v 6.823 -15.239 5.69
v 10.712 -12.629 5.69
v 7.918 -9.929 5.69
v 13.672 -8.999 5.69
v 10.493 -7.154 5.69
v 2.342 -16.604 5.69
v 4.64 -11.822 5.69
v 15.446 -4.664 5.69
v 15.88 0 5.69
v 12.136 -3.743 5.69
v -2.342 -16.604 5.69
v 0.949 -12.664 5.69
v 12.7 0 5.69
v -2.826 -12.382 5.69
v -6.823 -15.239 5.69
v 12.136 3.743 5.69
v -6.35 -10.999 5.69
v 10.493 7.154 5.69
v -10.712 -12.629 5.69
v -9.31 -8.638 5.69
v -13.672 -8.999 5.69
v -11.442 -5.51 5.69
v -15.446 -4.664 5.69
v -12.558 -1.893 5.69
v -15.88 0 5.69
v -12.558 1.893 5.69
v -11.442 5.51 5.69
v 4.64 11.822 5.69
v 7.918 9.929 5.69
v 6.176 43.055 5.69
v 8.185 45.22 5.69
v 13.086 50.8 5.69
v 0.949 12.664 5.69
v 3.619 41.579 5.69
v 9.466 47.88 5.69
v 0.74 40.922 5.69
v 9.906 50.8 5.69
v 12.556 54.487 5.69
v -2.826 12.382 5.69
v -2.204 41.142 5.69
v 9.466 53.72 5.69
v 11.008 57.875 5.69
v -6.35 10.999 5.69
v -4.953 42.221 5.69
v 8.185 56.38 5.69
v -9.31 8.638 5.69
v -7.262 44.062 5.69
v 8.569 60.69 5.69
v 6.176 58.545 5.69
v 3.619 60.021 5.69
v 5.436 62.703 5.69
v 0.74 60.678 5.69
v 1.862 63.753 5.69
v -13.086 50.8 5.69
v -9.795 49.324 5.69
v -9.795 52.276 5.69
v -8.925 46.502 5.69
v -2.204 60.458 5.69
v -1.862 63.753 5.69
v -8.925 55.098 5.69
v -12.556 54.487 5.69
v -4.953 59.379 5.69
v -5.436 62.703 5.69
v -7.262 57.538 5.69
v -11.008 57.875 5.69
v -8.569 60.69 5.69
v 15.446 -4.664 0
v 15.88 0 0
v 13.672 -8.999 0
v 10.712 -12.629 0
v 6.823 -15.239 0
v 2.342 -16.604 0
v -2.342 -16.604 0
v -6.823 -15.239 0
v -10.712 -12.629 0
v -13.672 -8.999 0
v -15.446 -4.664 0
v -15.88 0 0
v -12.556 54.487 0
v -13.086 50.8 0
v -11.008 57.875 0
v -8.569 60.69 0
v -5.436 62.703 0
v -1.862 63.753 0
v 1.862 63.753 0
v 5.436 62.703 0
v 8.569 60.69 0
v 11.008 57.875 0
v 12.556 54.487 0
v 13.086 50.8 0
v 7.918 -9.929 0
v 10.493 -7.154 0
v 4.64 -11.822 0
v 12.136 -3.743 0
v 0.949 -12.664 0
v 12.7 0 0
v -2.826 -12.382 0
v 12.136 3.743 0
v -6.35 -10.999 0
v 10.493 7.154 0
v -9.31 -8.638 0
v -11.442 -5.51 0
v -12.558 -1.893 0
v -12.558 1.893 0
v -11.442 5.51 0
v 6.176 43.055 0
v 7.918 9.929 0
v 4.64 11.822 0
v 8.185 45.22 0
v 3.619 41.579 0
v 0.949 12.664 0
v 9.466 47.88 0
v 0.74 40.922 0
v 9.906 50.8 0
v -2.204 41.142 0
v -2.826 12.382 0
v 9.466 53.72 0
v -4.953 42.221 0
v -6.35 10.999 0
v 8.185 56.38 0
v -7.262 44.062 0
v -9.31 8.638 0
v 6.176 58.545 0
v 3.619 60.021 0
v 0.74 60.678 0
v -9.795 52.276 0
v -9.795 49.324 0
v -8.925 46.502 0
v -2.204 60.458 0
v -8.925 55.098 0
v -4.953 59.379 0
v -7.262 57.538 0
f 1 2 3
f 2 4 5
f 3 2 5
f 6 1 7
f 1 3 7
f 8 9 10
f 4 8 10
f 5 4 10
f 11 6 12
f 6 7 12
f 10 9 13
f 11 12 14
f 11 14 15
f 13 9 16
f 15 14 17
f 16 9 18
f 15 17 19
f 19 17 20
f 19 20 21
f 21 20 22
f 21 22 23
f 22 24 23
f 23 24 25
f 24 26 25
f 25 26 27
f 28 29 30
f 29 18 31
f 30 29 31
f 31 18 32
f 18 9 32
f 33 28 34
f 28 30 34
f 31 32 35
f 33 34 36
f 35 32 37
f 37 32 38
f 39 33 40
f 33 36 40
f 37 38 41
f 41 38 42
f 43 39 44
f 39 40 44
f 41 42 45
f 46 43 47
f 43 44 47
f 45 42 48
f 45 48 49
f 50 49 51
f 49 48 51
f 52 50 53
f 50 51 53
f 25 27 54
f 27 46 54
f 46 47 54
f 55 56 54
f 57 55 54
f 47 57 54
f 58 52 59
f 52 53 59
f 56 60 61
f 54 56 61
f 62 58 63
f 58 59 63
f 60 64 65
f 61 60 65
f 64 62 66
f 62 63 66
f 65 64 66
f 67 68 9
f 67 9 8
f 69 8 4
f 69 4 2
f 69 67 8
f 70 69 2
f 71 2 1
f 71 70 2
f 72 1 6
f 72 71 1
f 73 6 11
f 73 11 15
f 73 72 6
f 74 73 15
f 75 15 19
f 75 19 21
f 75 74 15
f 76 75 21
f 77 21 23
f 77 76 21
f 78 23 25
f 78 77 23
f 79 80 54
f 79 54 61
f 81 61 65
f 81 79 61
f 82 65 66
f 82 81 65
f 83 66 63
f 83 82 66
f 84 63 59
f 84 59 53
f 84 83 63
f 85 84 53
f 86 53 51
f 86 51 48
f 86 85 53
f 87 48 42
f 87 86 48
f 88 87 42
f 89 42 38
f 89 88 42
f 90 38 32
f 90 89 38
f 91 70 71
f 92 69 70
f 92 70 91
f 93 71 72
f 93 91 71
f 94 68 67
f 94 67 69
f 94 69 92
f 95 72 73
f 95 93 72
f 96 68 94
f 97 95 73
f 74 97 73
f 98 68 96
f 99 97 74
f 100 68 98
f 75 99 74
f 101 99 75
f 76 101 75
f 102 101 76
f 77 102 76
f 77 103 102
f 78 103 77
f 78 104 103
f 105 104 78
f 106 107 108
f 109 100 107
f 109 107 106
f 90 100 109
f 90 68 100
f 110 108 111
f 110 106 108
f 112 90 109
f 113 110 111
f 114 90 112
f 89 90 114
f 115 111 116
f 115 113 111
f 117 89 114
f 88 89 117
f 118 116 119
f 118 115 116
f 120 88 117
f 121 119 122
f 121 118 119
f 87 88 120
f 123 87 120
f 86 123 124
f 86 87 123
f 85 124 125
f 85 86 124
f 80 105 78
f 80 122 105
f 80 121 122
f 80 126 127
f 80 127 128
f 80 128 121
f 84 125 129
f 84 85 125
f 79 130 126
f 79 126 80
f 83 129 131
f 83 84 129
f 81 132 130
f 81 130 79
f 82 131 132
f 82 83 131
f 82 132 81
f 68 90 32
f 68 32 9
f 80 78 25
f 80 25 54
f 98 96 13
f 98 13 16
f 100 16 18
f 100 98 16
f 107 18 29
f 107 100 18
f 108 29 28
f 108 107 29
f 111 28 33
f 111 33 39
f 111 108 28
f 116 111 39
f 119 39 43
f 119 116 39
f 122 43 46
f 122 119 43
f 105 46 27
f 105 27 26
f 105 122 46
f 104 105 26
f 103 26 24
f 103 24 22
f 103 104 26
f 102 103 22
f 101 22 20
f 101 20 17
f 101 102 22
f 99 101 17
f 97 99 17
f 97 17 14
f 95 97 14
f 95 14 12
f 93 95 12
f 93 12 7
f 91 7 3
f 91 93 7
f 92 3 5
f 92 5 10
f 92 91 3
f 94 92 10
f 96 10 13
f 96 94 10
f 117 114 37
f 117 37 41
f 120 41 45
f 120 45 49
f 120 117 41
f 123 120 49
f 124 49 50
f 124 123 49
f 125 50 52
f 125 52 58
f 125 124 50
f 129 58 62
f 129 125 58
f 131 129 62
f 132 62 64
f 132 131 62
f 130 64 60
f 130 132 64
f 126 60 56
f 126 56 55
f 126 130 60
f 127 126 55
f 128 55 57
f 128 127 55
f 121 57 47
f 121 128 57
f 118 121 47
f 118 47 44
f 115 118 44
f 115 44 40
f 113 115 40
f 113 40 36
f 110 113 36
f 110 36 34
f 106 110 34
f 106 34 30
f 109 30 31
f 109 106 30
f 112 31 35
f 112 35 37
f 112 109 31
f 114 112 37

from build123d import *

# Parameters (mm, degrees)
SKETCH1_R           = 9.906
SKETCH1_R_2         = 12.7
BOSS_EXTRUDE1_DEPTH = 5.6896


with BuildPart() as part:
    # Sketch1 → Boss-Extrude1 (new body)
    with BuildSketch(Plane.XY):
        with BuildLine():
            ThreePointArc((-13.085798561, 50.8), (0, 63.885798561), (13.085798561, 50.8))
            Line((13.085798561, 50.8), (15.879798561, 0))
            ThreePointArc((15.879798561, 0), (0, -16.777187541), (-15.879798561, 0))
            Line((-15.879798561, 0), (-13.085798561, 50.8))
        make_face()
        with Locations((0, 50.8)):
            Circle(SKETCH1_R, mode=Mode.SUBTRACT)
        Circle(SKETCH1_R_2, mode=Mode.SUBTRACT)
    extrude(amount=BOSS_EXTRUDE1_DEPTH)


solid = part.part
